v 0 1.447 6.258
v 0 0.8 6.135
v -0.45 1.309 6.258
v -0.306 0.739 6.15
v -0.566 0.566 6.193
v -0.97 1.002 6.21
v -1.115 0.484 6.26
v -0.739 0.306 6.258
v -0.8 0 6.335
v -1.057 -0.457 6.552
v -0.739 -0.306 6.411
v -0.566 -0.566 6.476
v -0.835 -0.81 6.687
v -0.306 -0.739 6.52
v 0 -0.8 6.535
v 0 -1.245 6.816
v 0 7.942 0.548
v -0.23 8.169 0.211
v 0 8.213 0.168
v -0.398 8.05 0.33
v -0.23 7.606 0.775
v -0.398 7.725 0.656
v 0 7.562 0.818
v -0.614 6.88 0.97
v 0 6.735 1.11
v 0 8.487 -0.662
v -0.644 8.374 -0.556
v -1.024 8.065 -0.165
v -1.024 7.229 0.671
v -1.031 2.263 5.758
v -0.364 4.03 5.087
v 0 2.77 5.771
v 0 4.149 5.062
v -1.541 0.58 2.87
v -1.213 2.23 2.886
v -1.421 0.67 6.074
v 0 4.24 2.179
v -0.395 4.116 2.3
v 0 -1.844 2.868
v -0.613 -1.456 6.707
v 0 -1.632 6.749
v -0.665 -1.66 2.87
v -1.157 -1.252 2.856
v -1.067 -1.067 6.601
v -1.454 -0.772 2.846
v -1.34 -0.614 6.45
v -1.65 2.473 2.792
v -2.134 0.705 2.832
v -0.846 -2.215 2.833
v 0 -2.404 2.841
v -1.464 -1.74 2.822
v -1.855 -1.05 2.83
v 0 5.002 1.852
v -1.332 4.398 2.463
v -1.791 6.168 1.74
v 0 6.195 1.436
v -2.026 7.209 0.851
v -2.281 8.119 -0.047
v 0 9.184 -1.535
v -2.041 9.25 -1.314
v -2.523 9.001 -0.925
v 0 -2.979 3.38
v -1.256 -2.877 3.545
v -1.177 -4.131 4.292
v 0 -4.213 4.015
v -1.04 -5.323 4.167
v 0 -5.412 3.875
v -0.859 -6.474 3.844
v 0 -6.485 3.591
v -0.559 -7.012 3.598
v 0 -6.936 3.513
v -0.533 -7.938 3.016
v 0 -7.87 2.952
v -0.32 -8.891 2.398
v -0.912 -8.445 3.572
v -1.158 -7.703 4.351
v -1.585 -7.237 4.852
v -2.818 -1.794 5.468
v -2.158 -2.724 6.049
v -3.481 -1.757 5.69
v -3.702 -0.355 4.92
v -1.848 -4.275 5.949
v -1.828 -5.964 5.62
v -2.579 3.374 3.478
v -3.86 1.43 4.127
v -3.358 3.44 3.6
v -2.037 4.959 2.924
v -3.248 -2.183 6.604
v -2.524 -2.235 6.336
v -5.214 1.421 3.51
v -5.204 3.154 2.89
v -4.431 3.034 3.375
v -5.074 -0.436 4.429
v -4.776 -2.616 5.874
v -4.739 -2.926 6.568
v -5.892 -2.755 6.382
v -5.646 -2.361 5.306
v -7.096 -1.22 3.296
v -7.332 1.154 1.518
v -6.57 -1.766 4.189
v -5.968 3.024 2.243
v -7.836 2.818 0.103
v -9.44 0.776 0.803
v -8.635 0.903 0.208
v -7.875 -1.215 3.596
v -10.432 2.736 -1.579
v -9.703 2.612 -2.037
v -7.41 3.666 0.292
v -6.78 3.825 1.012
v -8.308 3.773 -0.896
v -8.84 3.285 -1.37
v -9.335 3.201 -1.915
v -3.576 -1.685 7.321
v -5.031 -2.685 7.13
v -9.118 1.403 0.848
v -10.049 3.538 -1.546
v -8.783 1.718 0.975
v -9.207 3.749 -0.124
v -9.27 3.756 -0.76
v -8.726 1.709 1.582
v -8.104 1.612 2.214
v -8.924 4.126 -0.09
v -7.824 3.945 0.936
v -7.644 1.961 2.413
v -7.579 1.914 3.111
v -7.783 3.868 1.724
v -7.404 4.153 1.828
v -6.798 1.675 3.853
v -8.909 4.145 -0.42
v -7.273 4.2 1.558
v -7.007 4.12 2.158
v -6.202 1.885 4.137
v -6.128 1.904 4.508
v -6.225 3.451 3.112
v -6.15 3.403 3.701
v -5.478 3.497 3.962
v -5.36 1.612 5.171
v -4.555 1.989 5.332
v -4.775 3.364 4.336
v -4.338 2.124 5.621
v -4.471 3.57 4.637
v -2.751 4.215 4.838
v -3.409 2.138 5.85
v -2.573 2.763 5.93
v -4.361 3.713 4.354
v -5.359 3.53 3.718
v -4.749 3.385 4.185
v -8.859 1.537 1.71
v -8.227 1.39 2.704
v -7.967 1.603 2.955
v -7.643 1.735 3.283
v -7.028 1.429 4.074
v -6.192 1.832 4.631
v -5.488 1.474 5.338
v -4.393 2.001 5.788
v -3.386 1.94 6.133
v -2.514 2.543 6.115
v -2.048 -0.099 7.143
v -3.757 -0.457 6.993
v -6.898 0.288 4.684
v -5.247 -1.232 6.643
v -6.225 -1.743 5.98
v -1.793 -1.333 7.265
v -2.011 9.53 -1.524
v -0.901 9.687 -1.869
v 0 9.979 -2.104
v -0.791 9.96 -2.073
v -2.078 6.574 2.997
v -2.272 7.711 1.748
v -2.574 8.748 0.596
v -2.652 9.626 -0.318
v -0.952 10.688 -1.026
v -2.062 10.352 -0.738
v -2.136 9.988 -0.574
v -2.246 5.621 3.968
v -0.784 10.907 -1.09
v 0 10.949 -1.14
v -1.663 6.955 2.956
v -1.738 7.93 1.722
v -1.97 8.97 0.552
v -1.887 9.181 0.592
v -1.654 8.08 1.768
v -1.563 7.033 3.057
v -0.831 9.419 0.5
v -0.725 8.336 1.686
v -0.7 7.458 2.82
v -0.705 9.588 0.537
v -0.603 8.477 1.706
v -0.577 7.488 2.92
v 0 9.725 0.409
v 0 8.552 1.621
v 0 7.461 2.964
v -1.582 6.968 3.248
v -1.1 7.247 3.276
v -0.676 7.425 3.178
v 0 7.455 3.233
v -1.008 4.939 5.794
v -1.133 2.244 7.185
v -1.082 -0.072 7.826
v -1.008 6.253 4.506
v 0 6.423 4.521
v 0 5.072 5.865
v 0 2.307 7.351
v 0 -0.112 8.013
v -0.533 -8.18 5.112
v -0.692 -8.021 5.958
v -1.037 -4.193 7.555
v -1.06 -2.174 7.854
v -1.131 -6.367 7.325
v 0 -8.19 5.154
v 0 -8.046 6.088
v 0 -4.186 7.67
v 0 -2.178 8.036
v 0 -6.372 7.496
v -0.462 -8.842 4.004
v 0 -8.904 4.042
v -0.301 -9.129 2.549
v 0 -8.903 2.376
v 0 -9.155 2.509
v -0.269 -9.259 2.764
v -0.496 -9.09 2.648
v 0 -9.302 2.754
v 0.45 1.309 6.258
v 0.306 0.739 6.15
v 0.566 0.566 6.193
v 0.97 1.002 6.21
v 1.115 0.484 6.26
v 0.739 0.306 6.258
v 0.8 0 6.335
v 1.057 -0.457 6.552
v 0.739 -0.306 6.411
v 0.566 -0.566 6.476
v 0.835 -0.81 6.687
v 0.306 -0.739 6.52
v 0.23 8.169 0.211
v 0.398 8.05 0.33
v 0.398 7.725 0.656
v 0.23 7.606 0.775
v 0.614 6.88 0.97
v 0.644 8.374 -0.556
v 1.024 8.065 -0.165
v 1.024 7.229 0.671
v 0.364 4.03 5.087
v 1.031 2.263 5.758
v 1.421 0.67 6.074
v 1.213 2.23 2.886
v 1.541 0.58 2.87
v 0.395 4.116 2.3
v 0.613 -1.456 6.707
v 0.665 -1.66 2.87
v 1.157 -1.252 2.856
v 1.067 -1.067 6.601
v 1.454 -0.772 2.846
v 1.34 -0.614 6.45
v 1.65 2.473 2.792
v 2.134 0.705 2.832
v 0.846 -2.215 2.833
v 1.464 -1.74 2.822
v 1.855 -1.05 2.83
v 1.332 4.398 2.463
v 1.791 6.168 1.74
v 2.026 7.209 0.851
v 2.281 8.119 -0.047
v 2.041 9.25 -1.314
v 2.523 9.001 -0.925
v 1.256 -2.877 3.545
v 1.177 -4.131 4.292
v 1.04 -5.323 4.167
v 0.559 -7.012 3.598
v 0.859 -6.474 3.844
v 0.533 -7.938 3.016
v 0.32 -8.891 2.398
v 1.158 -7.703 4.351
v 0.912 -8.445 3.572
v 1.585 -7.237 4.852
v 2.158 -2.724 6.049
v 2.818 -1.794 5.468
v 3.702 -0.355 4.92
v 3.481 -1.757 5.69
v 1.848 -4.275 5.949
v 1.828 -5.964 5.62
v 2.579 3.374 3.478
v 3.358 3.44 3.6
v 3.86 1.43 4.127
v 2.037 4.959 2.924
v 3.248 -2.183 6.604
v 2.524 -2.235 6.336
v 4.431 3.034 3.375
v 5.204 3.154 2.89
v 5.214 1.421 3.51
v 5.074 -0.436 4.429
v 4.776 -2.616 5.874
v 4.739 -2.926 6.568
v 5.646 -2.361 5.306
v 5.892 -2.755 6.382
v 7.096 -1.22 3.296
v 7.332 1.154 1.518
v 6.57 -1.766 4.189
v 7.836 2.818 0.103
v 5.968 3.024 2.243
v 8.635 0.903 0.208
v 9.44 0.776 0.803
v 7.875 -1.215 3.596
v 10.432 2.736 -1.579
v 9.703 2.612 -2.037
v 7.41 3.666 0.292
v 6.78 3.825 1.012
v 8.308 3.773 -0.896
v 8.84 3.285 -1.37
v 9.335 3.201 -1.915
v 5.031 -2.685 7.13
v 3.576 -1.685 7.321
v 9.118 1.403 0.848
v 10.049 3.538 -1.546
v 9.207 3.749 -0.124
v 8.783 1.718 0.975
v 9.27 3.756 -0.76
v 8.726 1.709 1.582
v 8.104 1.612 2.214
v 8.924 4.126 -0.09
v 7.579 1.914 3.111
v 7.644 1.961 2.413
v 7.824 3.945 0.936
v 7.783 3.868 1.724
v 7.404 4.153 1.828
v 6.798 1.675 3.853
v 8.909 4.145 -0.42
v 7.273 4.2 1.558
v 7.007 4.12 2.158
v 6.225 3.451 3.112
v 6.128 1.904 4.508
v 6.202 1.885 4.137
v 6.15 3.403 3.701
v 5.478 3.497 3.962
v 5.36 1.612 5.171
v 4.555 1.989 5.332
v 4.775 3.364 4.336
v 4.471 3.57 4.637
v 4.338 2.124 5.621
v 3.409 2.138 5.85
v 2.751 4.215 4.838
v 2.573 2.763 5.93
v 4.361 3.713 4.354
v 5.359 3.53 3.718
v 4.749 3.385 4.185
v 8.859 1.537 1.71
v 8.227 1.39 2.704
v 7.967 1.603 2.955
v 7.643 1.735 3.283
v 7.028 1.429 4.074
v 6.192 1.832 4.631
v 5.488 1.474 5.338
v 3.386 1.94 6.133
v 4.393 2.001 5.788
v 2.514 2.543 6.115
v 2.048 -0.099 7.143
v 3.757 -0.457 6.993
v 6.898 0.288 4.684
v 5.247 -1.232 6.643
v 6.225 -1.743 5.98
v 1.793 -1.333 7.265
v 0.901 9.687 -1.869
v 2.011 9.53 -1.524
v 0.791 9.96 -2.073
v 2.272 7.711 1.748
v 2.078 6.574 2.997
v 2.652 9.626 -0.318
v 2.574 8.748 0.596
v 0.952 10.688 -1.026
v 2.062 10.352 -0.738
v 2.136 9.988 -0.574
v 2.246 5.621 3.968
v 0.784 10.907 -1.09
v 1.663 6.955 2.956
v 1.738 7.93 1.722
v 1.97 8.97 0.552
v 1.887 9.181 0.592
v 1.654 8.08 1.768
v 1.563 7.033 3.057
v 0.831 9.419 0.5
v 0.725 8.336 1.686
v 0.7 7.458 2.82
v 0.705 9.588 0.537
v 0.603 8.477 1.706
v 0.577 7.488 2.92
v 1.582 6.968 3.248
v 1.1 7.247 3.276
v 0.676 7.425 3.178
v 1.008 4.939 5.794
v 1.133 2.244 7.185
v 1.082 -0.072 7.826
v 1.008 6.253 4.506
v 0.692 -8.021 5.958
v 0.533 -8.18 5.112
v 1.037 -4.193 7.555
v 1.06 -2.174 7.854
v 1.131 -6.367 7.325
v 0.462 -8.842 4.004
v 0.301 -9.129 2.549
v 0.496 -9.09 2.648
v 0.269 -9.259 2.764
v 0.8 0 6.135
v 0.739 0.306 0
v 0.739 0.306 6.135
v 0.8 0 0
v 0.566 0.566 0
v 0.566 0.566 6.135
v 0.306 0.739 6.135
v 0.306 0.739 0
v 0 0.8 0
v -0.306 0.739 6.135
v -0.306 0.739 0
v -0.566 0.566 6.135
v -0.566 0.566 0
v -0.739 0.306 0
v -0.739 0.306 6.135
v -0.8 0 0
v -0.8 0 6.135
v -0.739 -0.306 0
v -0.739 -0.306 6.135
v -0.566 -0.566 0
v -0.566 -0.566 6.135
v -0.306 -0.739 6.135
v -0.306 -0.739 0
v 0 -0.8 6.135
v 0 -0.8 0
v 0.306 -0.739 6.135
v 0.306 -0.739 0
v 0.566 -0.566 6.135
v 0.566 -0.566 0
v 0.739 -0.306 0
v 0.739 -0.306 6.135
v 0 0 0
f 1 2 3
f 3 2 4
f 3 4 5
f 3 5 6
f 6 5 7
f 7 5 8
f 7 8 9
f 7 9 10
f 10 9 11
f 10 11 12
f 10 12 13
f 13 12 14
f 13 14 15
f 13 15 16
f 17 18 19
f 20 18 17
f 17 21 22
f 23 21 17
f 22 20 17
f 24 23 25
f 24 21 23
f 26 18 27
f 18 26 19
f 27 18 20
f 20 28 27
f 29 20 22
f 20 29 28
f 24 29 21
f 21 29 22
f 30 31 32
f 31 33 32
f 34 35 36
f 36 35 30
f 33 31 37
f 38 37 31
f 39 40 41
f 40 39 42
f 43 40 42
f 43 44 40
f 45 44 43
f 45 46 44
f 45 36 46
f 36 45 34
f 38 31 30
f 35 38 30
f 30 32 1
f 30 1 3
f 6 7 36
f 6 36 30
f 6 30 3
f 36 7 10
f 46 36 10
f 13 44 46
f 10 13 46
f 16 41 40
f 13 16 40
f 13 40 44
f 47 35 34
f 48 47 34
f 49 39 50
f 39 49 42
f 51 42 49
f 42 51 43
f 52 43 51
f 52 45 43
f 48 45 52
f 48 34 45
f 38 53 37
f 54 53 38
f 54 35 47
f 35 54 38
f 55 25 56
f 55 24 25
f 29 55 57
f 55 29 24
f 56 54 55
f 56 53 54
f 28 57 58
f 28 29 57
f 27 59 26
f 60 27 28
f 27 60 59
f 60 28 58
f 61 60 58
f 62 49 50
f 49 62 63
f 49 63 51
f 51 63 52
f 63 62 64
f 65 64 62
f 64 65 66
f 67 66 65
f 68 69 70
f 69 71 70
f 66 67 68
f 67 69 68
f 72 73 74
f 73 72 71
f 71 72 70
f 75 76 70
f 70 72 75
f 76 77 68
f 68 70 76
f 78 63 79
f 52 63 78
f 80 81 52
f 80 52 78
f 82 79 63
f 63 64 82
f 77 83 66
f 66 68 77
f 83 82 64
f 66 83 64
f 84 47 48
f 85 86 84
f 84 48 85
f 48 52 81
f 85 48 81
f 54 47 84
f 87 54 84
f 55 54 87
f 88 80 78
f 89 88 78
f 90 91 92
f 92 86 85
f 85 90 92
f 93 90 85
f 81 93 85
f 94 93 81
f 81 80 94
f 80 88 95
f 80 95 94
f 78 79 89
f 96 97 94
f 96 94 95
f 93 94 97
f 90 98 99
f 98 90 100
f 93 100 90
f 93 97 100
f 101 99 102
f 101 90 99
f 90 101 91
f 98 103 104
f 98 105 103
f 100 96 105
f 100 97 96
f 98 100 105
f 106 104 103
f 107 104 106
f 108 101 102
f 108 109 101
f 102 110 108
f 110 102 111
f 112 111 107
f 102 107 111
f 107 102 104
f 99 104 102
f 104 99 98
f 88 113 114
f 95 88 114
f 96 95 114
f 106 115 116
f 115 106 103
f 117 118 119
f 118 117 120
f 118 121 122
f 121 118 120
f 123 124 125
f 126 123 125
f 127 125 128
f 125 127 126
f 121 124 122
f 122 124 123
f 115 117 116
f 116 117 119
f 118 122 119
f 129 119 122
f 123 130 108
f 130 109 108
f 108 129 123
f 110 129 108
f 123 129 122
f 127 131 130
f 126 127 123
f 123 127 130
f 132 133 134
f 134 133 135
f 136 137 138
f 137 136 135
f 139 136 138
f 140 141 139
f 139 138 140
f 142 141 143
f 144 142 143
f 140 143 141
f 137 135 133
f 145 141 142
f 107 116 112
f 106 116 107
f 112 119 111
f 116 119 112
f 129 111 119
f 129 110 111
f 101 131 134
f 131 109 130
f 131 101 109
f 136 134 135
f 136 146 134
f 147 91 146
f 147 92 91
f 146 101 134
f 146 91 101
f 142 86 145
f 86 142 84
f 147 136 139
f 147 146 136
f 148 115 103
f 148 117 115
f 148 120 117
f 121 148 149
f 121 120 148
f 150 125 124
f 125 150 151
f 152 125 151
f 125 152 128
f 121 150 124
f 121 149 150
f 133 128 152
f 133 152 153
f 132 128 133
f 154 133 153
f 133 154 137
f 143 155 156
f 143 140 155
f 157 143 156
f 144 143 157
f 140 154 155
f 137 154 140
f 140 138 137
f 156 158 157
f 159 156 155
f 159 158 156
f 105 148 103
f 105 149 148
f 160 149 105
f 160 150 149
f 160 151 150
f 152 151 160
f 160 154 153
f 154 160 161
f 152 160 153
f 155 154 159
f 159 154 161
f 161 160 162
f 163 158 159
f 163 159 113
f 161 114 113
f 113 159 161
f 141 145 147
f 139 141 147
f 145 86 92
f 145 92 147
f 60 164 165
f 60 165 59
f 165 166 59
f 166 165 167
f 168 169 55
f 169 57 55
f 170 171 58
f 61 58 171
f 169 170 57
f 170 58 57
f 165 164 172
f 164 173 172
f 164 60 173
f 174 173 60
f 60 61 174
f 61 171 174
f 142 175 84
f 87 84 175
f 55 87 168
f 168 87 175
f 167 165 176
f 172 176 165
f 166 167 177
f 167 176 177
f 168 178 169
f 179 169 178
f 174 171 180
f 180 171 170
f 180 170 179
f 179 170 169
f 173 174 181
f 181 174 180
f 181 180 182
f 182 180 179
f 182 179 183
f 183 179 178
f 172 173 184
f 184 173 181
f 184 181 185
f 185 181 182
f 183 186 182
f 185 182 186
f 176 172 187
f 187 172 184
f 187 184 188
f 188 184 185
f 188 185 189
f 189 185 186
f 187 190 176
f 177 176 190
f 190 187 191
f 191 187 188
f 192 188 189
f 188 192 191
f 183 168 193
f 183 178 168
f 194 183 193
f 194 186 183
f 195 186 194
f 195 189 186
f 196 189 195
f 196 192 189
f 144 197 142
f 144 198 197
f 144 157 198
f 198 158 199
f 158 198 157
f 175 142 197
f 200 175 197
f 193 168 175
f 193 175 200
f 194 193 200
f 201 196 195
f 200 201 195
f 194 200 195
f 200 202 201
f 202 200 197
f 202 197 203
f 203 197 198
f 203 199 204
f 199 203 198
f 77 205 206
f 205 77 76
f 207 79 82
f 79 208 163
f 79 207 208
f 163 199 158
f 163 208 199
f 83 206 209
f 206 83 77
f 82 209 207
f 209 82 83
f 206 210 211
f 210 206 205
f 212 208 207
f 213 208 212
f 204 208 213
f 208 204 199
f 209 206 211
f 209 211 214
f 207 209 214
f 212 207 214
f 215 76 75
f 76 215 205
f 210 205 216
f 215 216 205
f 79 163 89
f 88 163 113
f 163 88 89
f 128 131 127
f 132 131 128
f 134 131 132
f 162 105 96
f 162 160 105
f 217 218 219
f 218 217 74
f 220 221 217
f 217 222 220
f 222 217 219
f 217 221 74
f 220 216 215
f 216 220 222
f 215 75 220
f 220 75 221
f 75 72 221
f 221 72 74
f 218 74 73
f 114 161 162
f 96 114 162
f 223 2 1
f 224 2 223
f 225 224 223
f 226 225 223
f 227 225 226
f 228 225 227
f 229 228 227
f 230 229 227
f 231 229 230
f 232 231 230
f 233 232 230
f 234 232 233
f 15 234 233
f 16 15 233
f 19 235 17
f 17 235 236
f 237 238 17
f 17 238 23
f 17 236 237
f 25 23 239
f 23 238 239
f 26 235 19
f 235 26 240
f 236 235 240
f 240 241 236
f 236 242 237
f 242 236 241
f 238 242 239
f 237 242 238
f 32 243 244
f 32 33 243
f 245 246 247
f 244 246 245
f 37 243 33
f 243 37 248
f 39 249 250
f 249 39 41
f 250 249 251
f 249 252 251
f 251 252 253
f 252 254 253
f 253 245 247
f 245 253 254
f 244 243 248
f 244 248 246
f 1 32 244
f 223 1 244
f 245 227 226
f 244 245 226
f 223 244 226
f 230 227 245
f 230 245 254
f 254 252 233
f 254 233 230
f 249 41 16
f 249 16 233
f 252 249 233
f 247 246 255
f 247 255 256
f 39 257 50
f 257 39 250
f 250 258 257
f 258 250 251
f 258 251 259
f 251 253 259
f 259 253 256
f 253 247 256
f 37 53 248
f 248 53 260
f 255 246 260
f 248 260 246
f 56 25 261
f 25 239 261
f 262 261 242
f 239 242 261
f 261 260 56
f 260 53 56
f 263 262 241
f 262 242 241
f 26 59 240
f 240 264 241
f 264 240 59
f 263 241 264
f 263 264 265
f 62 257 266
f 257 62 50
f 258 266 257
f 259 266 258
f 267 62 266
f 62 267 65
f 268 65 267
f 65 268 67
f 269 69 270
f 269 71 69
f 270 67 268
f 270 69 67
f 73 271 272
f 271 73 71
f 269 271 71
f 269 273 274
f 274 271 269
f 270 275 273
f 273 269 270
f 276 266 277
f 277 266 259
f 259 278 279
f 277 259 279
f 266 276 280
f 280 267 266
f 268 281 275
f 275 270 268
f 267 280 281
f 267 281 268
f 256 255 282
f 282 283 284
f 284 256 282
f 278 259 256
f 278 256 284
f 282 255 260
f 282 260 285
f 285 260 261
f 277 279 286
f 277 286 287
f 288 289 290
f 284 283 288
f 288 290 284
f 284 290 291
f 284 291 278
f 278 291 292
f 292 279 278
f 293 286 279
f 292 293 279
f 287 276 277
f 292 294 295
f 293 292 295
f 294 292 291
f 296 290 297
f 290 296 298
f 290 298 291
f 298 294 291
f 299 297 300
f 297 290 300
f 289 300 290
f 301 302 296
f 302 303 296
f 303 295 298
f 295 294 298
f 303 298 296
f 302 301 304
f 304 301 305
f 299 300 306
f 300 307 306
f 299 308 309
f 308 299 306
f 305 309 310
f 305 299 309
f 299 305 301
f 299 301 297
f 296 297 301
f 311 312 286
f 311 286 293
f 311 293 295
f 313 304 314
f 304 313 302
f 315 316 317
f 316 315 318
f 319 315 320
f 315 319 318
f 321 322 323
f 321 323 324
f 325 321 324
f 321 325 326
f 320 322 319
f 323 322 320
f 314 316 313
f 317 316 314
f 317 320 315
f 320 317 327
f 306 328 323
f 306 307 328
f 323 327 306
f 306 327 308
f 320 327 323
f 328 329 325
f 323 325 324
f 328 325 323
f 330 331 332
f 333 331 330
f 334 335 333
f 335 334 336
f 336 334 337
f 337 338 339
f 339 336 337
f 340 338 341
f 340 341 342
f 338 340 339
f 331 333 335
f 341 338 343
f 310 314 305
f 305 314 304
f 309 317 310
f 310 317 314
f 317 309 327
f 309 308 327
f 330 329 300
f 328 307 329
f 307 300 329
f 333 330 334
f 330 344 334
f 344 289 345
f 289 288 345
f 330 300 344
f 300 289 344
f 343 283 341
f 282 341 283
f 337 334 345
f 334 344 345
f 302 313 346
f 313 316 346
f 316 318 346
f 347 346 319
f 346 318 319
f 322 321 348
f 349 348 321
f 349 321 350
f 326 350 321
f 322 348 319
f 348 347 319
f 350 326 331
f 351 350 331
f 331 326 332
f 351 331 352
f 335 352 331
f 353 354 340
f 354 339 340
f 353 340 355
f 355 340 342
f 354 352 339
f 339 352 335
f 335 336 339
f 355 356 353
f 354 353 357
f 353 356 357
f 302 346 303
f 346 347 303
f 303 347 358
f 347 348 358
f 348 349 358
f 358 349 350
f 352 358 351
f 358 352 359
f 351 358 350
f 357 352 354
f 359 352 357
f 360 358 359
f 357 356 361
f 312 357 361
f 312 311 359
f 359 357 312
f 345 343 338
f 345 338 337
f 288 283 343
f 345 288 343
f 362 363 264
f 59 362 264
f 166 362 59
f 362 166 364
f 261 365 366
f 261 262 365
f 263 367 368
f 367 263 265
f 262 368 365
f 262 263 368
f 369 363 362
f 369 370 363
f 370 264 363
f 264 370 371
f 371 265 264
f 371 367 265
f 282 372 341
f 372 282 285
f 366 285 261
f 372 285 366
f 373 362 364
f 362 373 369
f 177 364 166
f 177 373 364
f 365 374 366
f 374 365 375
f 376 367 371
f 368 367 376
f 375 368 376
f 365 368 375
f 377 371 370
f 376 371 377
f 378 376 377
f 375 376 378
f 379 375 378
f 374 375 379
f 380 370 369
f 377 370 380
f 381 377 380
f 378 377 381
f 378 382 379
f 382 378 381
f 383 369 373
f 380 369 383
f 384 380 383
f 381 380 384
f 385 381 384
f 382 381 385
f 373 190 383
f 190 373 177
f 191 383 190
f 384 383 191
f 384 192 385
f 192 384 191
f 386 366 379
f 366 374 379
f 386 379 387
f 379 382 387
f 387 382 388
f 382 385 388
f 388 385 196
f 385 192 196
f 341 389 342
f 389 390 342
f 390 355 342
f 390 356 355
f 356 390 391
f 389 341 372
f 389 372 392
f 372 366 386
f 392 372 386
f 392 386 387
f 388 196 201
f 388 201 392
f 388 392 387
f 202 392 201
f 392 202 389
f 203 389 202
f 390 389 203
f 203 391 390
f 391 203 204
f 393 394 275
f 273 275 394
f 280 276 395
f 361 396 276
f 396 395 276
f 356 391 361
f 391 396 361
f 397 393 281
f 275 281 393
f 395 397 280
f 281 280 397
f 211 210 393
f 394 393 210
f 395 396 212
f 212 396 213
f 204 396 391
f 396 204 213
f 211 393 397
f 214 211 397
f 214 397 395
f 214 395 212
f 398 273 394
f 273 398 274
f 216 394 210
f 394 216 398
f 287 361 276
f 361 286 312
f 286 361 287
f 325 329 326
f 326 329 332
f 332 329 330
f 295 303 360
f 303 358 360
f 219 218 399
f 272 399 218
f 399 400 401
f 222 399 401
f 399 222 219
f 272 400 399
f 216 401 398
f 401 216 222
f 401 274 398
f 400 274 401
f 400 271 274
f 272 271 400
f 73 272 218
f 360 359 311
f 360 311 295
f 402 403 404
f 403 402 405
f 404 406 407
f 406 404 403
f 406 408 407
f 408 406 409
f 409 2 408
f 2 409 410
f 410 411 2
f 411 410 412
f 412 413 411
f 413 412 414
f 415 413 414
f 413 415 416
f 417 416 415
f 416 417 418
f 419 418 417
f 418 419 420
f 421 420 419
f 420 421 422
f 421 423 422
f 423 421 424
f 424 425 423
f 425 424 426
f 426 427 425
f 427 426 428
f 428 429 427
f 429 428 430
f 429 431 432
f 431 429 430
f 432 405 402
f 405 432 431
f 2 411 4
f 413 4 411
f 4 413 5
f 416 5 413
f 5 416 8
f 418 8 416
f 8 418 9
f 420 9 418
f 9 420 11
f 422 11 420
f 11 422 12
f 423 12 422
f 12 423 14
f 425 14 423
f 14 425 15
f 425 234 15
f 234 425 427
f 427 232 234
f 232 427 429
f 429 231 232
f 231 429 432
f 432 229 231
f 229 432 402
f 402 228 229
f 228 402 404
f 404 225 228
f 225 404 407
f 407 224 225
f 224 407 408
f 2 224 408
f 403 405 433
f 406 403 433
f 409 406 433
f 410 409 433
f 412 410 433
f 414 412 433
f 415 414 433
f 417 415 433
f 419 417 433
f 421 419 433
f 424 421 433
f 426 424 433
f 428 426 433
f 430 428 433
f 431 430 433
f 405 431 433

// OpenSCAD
use <../lib.scad>
use <../p/4-4cyli.scad>
use <../p/4-4cyls.scad>
use <../p/4-4disc.scad>
use <../p/4-4edge.scad>
use <s/13665s01.scad>
function ldraw_lib__13665() = [
// 0 Animal Bird Crow
// 0 Name: 13665.dat
// 0 Author: Stan Isachenko [angmarec]
// 0 !LDRAW_ORG Part UPDATE 2014-01
// 0 !LICENSE Licensed under CC BY 2.0 and CC BY 4.0 : see CAreadme.txt
// 
// 0 BFC CERTIFY CCW
  [0,"BFC","CERTIFY"],
  [0,"BFC","CCW"],
// 
// 0 !CATEGORY Minifig Accessory
// 0 !KEYWORDS Minifig Plume
// 
// 0 !HISTORY 2014-01-08 {LEGO Digital Designer} Original part shape
// 0 !HISTORY 2014-01-08 [angmarec] File preparation for LDraw Parts Tracker
// 0 !HISTORY 2014-06-21 [PTadmin] Official Update 2014-01
// 
// 
// 1 16 0 0 0 1 0 0 0 1 0 0 0 1 s\13665s01.dat
  [1,16,0,0,0,1,0,0,0,1,0,0,0,1, ldraw_lib__s__13665s01()],
// 1 16 0 0 0 -1 0 0 0 1 0 0 0 1 s\13665s01.dat
  [1,16,0,0,0,-1,0,0,0,1,0,0,0,1, ldraw_lib__s__13665s01()],
// 0 // ///
// 1 16 0 0 0 2 0 0 0 -15.337 0 0 0 2 4-4cyli.dat
  [1,16,0,0,0,2,0,0,0,-15.337,0,0,0,2, ldraw_lib__4_4cyli()],
// 1 16 0 -15.337 0 0 0 -2 0 -0.5 0 2 0 0 4-4cyls.dat
  [1,16,0,-15.337,0,0,0,-2,0,-0.5,0,2,0,0, ldraw_lib__4_4cyls()],
// 1 16 0 0 0 2 0 0 0 -1 0 0 0 2 4-4disc.dat
  [1,16,0,0,0,2,0,0,0,-1,0,0,0,2, ldraw_lib__4_4disc()],
// 1 16 0 0 0 2 0 0 0 -1 0 0 0 2 4-4edge.dat
  [1,16,0,0,0,2,0,0,0,-1,0,0,0,2, ldraw_lib__4_4edge()],
];
module ldraw_lib__13665(step=0, col=false, unit=2/5, alt=false, line=0.2, solid=!$preview)
    makepoly(ldraw_lib__13665(), step=step, col=col, unit=unit, alt=alt, line=line, solid=solid);
ldraw_lib__13665(line=0.2);
